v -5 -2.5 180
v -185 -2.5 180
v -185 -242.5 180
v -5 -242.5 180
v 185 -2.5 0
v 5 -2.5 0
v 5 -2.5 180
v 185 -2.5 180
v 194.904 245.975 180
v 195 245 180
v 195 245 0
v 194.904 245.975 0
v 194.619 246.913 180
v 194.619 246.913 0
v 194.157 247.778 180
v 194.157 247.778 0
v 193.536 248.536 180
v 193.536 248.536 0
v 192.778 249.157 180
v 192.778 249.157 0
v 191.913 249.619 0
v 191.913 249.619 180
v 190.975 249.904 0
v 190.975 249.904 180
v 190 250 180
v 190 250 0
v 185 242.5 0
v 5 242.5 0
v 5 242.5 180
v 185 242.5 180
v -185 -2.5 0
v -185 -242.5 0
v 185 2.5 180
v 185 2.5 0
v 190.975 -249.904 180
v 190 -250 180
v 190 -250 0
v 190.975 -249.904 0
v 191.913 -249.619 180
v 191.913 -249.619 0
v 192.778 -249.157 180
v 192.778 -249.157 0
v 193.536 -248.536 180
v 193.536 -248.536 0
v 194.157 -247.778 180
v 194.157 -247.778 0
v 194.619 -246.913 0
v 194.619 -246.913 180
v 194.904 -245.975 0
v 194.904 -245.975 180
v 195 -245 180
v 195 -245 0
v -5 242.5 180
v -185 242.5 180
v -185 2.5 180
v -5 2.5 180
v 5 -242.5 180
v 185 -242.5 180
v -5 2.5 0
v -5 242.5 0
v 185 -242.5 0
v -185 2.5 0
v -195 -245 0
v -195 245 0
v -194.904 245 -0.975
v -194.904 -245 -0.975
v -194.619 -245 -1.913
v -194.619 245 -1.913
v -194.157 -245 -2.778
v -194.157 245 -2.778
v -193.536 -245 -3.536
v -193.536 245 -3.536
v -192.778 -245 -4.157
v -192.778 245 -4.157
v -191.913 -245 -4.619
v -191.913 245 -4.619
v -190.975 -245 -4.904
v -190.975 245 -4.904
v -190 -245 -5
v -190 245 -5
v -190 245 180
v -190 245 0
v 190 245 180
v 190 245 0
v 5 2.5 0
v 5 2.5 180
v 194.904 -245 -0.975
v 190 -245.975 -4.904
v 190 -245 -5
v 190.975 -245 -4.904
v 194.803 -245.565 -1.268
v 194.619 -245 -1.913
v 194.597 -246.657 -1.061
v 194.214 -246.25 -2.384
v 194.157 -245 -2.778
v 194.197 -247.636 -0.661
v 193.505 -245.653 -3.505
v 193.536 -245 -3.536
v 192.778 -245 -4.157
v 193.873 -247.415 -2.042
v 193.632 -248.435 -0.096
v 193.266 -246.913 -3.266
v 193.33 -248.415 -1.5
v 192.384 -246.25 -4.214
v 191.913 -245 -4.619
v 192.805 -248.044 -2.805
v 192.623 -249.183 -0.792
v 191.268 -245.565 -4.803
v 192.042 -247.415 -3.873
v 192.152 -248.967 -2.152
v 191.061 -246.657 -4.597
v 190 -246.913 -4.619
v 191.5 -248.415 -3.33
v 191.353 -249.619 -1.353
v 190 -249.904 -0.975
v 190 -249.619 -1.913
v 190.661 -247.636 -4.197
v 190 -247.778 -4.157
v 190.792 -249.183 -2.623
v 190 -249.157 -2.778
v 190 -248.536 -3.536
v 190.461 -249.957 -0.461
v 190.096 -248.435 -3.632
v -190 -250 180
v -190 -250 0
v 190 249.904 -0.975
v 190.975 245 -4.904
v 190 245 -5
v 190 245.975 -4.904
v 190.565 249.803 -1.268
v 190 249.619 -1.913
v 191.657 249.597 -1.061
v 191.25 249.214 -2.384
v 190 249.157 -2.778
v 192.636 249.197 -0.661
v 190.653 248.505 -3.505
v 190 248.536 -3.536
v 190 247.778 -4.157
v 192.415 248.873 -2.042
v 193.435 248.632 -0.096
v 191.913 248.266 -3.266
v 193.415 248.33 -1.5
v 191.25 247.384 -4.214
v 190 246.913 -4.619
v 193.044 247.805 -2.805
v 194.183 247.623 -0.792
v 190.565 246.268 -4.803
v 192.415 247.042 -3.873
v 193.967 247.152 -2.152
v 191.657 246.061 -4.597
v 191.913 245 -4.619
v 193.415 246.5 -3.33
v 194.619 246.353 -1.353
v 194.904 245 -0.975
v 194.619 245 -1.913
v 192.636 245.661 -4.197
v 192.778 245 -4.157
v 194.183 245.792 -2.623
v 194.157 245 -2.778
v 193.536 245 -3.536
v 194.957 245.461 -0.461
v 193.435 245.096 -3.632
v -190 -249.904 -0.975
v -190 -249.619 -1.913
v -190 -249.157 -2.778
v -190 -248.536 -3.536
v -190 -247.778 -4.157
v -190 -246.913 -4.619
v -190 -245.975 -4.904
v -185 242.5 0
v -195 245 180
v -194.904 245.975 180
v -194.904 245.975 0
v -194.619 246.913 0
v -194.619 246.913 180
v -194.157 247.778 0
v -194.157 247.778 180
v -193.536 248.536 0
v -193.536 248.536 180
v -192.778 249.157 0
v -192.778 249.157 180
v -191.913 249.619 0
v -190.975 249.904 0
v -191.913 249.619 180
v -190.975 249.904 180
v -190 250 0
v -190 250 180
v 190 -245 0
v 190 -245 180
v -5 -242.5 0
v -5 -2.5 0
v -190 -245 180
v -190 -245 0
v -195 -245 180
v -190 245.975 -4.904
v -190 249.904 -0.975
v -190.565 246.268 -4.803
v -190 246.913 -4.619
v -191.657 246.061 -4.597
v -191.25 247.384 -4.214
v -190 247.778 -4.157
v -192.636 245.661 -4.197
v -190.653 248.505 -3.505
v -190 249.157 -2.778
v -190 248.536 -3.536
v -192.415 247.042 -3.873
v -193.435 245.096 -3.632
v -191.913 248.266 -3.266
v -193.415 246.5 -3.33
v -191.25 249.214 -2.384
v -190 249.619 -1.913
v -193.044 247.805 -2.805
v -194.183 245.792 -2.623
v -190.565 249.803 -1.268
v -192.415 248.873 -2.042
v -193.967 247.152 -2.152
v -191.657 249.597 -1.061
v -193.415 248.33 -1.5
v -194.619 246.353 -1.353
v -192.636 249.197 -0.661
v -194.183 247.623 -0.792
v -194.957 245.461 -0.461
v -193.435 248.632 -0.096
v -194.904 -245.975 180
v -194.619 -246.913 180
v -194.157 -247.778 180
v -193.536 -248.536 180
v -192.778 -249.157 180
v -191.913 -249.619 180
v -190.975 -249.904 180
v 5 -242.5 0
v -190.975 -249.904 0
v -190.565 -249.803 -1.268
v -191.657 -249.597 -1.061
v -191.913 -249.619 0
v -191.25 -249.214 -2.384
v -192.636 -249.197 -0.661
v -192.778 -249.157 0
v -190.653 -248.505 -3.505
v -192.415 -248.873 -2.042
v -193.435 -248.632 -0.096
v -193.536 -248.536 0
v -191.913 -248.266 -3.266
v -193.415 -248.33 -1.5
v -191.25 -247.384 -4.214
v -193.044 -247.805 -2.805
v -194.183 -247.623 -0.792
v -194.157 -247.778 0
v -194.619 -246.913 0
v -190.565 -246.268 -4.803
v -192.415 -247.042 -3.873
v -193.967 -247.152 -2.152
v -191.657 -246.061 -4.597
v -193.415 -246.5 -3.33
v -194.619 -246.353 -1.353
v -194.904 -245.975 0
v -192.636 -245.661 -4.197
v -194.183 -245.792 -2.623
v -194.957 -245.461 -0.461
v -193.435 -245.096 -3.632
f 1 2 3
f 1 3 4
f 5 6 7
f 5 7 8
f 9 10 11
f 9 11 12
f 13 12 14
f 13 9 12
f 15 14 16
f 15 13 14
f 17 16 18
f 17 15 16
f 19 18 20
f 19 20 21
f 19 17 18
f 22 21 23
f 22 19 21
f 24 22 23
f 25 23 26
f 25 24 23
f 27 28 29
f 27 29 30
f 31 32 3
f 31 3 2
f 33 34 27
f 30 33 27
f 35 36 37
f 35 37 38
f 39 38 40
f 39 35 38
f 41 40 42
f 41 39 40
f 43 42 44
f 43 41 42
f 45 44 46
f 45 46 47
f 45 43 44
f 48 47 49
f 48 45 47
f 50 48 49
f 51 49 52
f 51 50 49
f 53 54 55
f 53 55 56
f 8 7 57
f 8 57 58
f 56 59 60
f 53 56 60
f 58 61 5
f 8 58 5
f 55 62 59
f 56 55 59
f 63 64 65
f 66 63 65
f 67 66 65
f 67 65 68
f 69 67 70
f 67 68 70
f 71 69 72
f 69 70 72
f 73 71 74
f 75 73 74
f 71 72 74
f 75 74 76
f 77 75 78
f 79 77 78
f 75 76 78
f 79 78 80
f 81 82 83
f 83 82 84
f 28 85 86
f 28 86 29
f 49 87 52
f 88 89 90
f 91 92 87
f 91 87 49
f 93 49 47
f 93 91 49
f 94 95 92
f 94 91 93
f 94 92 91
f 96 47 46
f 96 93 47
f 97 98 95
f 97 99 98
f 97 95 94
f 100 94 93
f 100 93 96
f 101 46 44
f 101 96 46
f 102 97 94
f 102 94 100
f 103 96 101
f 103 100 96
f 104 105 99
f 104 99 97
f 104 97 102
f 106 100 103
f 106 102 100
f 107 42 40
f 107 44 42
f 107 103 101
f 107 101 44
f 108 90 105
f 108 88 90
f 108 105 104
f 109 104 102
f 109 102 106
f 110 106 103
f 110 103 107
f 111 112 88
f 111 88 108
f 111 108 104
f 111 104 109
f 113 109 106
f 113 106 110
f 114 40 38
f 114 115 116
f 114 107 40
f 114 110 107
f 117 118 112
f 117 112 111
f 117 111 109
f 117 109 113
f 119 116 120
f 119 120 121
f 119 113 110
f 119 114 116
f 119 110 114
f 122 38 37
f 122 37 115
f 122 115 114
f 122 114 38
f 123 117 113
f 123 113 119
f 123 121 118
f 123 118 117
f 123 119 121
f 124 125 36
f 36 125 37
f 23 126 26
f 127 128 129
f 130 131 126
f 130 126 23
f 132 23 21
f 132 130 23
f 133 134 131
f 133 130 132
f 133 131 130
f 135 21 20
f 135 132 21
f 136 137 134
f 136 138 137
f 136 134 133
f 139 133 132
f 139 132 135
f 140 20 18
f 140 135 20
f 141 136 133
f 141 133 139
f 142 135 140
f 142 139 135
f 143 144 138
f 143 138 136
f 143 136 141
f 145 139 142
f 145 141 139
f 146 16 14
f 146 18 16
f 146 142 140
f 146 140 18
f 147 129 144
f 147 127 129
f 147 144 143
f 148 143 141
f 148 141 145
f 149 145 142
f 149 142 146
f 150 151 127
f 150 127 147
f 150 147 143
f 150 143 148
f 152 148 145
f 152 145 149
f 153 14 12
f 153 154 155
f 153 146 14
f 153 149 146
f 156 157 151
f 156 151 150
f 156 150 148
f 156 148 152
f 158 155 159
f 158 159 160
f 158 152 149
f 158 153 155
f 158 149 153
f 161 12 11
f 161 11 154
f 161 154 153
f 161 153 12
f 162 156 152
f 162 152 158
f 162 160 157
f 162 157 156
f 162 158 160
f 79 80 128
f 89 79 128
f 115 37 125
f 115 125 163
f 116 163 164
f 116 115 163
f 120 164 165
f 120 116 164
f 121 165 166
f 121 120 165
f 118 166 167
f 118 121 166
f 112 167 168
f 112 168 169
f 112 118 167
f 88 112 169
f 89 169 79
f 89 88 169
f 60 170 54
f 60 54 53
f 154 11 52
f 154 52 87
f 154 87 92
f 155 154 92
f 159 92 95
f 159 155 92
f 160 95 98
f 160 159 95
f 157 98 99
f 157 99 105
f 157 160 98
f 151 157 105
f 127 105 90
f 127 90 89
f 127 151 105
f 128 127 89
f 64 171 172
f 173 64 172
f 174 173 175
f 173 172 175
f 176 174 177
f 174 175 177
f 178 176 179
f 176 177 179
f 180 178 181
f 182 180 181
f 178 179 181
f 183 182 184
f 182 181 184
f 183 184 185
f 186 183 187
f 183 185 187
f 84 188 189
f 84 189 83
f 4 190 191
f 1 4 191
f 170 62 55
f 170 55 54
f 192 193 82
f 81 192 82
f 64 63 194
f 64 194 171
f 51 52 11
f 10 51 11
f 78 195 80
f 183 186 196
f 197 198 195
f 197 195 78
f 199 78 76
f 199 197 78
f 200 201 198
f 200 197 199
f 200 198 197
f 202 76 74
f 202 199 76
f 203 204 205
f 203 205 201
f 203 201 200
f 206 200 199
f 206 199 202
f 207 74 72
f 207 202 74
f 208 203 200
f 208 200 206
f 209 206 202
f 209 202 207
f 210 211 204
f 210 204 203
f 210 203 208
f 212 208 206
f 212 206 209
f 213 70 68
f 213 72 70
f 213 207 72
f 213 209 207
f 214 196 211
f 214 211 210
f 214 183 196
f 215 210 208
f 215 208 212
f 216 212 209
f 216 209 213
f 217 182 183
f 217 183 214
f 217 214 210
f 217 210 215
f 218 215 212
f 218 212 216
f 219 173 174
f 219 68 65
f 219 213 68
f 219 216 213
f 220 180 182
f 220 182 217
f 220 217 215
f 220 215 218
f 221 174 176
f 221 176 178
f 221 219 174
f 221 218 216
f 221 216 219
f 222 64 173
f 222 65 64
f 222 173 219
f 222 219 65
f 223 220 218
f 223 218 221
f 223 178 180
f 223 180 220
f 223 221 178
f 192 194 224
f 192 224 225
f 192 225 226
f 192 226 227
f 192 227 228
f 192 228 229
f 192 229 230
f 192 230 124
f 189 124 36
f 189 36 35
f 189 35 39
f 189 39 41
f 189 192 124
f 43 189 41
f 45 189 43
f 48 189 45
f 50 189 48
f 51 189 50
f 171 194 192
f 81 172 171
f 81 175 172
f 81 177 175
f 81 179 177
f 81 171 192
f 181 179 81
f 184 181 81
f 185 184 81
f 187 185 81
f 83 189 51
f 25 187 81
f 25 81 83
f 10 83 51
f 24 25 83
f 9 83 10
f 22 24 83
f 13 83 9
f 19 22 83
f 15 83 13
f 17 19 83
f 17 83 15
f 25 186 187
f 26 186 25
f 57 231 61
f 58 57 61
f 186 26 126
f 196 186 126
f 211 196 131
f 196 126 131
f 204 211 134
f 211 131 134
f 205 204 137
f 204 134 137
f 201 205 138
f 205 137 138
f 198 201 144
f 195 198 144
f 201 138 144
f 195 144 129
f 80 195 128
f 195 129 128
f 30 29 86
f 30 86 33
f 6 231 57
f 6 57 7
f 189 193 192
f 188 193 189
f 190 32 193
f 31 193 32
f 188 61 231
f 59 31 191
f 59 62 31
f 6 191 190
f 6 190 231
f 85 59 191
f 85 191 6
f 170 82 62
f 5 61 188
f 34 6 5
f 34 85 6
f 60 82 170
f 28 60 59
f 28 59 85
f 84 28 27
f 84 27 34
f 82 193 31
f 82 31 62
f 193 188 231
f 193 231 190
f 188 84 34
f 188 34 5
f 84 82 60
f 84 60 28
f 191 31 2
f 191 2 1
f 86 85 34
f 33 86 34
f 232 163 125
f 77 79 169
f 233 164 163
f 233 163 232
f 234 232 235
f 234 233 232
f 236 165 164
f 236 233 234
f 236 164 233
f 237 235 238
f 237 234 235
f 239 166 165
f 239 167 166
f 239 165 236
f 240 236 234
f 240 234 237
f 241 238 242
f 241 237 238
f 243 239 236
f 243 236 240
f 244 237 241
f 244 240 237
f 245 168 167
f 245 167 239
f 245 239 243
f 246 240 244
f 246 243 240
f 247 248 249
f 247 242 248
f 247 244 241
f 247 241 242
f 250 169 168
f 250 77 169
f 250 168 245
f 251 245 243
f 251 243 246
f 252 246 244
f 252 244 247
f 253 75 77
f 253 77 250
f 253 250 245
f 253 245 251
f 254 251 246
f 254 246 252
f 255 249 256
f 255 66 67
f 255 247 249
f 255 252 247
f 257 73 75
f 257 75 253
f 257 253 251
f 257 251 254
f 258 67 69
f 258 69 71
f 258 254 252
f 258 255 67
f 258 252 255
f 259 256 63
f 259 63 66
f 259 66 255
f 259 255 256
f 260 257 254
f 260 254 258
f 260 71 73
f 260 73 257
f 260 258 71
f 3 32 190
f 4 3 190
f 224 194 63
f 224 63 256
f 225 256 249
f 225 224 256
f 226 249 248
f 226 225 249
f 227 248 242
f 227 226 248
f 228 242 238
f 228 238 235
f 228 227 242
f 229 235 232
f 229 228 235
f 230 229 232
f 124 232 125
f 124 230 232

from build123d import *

# Parameters (mm, degrees)
SKETCH_W     = 380
SKETCH_H     = 490
PAD_DEPTH    = 180
THICKNESS_T  = 5
SKETCH001_W  = 180
SKETCH001_H  = 240
PAD001_DEPTH = 180
PAD002_DEPTH = 10


with BuildPart() as part:
    # Sketch → Pad (new body)
    with BuildSketch(Plane.XY):
        Rectangle(SKETCH_W, SKETCH_H)
    extrude(amount=PAD_DEPTH)

    # Thickness
    thickness_openings = [part.faces().sort_by_distance(p)[0] for p in [
        (0, 0, 180),
    ]]
    offset(amount=THICKNESS_T, openings=thickness_openings)

    # Sketch001 (on Face5 of Thickness) → Pad001 (join)
    with BuildSketch(Plane.XY):
        with Locations((-95, 122.5)):
            Rectangle(SKETCH001_W, SKETCH001_H)
        with Locations((95, 122.5)):
            Rectangle(SKETCH001_W, SKETCH001_H)
        with Locations((-95, -122.5)):
            Rectangle(SKETCH001_W, SKETCH001_H)
        with Locations((95, -122.5)):
            Rectangle(SKETCH001_W, SKETCH001_H)
    extrude(amount=PAD001_DEPTH)

    # Sketch001 (on Face5 of Thickness) → Pad002 (join)
    with BuildSketch(Plane.XY):
        with Locations((-95, 122.5)):
            Rectangle(SKETCH001_W, SKETCH001_H)
        with Locations((95, 122.5)):
            Rectangle(SKETCH001_W, SKETCH001_H)
        with Locations((-95, -122.5)):
            Rectangle(SKETCH001_W, SKETCH001_H)
        with Locations((95, -122.5)):
            Rectangle(SKETCH001_W, SKETCH001_H)
    extrude(amount=PAD002_DEPTH)


solid = part.part
